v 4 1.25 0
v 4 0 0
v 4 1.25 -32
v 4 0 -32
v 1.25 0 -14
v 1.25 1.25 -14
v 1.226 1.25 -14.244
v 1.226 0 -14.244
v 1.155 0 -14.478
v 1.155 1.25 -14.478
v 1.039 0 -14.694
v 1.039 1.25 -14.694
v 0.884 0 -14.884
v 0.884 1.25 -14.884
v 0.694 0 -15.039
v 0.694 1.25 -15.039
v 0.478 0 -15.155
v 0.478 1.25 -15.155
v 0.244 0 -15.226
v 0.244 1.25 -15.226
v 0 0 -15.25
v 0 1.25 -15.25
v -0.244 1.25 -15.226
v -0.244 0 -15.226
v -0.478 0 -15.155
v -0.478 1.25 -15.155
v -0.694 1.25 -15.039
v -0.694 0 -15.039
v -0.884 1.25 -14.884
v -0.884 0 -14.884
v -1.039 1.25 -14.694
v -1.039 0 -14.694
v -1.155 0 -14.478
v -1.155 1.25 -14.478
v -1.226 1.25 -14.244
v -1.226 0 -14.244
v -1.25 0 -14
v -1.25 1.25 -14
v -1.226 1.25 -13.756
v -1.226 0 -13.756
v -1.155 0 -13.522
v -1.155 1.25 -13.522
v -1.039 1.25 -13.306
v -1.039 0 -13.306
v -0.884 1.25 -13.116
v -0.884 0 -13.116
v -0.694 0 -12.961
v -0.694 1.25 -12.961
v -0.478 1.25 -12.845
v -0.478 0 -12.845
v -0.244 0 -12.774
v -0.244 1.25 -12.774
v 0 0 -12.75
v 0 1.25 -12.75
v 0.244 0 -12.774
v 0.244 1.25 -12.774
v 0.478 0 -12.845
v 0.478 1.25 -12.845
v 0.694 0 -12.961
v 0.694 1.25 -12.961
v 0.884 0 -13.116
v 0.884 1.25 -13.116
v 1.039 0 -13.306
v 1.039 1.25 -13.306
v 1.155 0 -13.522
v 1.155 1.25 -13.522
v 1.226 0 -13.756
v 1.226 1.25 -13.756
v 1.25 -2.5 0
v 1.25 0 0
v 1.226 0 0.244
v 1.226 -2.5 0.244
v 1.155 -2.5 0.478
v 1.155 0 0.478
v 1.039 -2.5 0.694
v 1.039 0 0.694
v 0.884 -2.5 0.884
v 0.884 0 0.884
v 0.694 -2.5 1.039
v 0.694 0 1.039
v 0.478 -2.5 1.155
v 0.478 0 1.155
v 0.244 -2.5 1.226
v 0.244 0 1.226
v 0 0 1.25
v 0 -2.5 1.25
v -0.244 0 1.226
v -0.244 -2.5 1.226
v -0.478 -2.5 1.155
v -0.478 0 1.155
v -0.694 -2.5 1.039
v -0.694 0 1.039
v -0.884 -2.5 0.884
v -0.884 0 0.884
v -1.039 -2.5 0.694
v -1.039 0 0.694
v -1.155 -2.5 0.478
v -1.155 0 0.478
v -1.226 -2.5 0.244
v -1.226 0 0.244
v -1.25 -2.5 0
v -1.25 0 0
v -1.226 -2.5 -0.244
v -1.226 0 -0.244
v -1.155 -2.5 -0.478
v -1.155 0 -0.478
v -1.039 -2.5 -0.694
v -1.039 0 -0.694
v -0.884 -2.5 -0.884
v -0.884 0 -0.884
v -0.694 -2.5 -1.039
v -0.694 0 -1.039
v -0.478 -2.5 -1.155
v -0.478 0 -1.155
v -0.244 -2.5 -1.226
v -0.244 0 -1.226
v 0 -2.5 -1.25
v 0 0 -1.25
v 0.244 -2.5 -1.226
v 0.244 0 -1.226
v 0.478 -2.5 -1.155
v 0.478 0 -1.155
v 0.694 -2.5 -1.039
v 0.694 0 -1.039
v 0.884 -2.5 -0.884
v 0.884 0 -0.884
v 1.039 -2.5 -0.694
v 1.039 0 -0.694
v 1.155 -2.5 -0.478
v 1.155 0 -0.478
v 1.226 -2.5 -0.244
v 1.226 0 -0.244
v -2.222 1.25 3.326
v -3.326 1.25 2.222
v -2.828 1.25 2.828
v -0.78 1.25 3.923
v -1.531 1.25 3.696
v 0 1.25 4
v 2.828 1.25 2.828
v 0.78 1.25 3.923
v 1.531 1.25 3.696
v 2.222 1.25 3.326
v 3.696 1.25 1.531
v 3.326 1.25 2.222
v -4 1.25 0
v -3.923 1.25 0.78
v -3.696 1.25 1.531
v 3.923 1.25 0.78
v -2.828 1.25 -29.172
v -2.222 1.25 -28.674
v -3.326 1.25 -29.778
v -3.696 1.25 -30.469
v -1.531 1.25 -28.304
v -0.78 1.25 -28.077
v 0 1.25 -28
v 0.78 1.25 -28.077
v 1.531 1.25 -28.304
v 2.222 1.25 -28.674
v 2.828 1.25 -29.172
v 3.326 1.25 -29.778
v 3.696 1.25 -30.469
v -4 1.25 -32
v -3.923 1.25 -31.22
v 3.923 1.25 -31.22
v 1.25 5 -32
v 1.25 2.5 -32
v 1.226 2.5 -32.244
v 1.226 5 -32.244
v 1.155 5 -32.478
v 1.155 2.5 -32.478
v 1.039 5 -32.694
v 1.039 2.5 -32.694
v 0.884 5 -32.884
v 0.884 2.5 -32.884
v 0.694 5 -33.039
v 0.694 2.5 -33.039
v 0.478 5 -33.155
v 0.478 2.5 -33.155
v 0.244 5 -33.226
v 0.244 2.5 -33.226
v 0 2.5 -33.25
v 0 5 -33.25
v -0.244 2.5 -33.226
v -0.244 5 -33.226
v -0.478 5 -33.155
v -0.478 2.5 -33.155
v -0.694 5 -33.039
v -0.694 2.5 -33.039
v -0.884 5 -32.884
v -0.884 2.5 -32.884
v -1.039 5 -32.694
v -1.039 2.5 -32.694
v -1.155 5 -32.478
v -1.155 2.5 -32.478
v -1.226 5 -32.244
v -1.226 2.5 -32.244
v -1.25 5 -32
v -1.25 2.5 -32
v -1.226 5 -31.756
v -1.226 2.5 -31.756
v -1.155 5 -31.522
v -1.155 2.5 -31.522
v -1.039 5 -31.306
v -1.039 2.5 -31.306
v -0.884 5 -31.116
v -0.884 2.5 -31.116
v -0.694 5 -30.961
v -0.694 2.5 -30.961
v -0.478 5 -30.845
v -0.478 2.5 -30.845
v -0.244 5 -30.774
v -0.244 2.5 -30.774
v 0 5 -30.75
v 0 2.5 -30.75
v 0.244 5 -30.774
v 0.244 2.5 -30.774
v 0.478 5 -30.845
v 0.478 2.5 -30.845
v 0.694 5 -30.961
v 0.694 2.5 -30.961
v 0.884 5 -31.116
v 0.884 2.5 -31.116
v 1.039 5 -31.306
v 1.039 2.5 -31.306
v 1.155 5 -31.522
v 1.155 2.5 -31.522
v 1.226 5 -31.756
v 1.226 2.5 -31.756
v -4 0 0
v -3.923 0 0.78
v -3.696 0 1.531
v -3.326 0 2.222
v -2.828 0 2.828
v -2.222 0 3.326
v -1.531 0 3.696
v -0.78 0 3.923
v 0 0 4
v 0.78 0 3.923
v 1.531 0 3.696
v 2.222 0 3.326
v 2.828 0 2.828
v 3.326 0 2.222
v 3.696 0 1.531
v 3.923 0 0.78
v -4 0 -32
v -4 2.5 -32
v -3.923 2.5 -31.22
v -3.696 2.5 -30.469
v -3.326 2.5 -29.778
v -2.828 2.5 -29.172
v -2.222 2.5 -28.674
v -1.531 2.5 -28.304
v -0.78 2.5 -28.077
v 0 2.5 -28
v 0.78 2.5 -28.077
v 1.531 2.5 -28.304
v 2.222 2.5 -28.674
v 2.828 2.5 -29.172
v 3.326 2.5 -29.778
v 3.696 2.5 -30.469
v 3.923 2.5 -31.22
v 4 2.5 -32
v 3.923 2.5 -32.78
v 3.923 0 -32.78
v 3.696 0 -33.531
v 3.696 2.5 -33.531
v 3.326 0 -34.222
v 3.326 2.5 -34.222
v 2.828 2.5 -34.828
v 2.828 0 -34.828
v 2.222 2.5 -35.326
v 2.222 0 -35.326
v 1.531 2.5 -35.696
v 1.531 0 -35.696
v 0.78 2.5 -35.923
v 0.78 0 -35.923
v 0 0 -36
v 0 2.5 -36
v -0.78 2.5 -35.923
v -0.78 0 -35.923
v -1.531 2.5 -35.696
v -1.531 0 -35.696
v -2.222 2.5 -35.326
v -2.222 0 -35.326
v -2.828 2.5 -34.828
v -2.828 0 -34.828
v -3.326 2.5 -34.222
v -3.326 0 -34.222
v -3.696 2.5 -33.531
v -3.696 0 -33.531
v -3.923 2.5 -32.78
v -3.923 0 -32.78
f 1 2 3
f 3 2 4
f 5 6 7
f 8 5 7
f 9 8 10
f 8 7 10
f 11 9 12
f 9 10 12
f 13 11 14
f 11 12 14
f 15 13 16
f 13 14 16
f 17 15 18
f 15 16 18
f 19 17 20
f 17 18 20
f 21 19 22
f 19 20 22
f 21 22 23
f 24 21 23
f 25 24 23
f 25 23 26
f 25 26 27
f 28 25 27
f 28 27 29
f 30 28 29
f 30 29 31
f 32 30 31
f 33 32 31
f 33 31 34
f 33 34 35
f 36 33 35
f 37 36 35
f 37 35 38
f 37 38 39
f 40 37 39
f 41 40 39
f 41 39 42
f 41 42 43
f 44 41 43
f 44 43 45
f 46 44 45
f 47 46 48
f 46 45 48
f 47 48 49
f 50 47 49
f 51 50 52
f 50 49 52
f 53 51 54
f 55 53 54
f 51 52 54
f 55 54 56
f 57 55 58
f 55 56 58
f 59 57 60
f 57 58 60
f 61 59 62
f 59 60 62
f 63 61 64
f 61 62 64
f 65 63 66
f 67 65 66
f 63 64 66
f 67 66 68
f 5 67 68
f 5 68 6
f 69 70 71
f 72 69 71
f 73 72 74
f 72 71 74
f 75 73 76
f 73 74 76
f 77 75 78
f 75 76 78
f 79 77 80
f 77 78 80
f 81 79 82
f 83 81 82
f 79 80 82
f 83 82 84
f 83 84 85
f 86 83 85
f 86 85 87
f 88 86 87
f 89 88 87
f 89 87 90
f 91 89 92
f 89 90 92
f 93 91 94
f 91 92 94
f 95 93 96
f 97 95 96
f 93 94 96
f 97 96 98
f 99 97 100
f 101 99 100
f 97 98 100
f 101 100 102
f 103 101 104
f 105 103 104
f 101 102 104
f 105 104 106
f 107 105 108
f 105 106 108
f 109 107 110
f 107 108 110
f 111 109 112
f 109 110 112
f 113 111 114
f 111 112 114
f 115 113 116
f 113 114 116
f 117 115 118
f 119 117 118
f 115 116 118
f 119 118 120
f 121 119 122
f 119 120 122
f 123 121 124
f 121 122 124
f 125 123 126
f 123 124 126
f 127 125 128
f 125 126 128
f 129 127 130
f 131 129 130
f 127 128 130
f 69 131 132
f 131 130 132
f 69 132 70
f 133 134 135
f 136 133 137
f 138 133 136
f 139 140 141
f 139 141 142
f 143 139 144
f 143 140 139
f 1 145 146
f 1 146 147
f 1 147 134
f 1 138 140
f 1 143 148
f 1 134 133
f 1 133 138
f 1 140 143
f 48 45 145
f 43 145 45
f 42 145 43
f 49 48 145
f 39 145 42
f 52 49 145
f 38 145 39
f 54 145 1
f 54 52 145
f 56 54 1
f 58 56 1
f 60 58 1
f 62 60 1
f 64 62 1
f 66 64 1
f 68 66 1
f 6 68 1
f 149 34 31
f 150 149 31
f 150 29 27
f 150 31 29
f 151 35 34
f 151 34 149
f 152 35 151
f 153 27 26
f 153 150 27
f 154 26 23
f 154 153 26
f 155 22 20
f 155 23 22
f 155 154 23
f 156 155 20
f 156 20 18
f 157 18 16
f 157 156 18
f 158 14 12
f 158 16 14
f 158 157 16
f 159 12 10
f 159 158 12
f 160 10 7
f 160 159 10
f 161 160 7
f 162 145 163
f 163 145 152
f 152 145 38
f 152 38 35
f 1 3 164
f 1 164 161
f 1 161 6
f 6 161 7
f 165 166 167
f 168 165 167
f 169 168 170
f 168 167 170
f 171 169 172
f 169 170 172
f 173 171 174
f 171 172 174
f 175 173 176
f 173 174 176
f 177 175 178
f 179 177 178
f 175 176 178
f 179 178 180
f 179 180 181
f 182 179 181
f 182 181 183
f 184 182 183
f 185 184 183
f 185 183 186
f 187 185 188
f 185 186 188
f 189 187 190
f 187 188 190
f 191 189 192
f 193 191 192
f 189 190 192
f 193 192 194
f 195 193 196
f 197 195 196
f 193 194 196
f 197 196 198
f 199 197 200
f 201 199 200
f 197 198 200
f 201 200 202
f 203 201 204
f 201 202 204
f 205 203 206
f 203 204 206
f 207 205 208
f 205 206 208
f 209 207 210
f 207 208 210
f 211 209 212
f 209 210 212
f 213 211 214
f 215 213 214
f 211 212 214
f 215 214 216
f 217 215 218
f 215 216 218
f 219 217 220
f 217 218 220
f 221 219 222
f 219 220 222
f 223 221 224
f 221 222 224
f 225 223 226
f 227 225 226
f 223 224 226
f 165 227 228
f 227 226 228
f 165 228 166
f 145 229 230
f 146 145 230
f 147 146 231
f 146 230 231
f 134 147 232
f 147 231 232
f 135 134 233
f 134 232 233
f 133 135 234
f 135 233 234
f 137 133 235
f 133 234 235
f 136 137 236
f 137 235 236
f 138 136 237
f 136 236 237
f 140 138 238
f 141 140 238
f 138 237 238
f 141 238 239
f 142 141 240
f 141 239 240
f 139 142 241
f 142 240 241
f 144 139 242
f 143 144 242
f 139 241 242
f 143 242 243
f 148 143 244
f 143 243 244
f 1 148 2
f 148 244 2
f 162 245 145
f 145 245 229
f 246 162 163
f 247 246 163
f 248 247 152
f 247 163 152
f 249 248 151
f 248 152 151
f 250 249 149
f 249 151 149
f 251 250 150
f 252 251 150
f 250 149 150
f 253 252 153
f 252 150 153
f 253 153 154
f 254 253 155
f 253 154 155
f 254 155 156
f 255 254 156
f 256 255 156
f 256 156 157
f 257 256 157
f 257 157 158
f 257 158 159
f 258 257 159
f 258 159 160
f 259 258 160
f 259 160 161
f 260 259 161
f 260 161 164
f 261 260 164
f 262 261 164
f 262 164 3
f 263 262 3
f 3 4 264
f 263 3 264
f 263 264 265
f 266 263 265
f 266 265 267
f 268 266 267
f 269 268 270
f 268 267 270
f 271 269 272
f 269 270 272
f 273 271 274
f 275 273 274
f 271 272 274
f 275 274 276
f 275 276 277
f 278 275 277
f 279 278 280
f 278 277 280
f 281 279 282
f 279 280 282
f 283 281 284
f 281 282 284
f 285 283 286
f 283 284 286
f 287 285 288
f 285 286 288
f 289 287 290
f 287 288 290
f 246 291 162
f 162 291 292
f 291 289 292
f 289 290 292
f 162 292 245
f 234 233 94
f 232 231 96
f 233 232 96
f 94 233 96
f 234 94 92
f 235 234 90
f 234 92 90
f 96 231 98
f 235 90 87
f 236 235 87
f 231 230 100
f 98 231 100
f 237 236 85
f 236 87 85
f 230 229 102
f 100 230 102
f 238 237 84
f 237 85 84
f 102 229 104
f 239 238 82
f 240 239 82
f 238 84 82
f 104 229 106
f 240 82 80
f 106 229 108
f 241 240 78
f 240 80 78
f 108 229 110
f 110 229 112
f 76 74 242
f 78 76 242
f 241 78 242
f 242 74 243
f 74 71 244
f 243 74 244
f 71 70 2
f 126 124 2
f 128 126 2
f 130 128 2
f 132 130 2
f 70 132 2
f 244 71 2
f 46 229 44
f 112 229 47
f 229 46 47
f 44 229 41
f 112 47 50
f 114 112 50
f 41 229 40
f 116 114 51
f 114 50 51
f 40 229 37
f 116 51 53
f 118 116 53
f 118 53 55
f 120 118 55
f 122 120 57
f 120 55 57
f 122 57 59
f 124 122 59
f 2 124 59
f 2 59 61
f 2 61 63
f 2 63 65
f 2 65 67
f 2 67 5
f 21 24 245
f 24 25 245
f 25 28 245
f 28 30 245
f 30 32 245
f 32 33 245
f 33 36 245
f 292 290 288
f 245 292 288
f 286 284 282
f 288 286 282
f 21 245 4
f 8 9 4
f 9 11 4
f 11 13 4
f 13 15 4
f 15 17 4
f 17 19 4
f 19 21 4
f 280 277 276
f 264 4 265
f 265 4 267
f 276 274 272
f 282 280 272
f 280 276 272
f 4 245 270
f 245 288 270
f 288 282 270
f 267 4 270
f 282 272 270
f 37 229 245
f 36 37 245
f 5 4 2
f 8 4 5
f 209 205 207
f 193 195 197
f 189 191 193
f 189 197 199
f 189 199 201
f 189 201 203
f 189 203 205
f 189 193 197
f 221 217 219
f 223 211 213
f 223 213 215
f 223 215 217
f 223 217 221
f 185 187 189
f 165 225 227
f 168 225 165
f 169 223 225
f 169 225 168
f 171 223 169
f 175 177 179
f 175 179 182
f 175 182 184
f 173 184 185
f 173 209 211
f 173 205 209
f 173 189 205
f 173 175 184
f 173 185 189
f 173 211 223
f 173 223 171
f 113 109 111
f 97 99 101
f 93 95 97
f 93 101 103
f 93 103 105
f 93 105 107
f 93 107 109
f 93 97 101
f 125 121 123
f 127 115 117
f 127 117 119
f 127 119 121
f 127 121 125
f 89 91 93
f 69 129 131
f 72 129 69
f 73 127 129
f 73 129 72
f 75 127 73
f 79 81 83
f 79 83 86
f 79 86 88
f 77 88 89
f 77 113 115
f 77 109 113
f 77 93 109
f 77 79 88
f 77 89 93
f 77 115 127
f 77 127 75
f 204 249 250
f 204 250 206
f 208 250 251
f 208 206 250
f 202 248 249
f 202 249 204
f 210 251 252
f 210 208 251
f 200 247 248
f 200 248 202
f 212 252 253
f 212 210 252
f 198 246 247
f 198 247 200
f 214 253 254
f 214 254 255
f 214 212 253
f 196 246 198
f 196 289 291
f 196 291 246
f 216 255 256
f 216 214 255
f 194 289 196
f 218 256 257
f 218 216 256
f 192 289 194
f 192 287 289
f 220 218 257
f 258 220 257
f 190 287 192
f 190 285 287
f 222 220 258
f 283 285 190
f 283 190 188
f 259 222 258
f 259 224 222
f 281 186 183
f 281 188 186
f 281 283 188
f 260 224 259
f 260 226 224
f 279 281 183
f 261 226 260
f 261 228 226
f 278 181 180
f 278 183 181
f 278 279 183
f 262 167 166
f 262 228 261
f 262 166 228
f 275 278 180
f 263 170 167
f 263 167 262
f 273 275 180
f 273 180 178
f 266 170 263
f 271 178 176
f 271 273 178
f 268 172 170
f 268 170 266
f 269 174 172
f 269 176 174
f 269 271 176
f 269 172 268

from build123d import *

# Parameters (mm, degrees)
BOSS_EXTRUDE1_DEPTH = 2.5
BOSS_EXTRUDE5_DEPTH = 1.25
SKETCH6_R           = 1.25
BOSS_EXTRUDE6_DEPTH = 2.5
SKETCH7_R           = 1.25
BOSS_EXTRUDE7_DEPTH = 2.5
SKETCH8_R           = 1.25
CUT_EXTRUDE3_DEPTH  = 2.5


with BuildPart() as part:
    # Sketch1 → Boss-Extrude1 (new body)
    with BuildSketch(Plane(origin=(0, 0, 0), x_dir=(1, 0, 0), z_dir=(0, 1, 0))):
        with BuildLine():
            ThreePointArc((4, 32), (0, 36), (-4, 32))
            ThreePointArc((-4, 32), (0, 28), (4, 32))
        make_face()
    extrude(amount=BOSS_EXTRUDE1_DEPTH)

    # Sketch1<4> → Boss-Extrude5 (add)
    with BuildSketch(Plane(origin=(0, 0, 0), x_dir=(1, 0, 0), z_dir=(0, 1, 0))):
        with BuildLine():
            Line((-4, 32), (-4, 0))
            ThreePointArc((-4, 0), (0, -4), (4, 0))
            Line((4, 0), (4, 32))
            ThreePointArc((4, 32), (0, 28), (-4, 32))
        make_face()
    extrude(amount=BOSS_EXTRUDE5_DEPTH)

    # Sketch6 → Boss-Extrude6 (add)
    with BuildSketch(Plane(origin=(0, 2.5, 0), x_dir=(1, 0, 0), z_dir=(0, 1, 0))):
        with Locations((0, 32)):
            Circle(SKETCH6_R)
    extrude(amount=BOSS_EXTRUDE6_DEPTH)

    # Sketch7 → Boss-Extrude7 (add)
    with BuildSketch(Plane.XZ):
        Circle(SKETCH7_R)
    extrude(amount=BOSS_EXTRUDE7_DEPTH)

    # Sketch8 → Cut-Extrude3 (cut)
    with BuildSketch(Plane(origin=(0, 1.25, 0), x_dir=(1, 0, 0), z_dir=(0, 1, 0))):
        with Locations((0, 14)):
            Circle(SKETCH8_R)
    extrude(amount=-CUT_EXTRUDE3_DEPTH, mode=Mode.SUBTRACT)


solid = part.part
